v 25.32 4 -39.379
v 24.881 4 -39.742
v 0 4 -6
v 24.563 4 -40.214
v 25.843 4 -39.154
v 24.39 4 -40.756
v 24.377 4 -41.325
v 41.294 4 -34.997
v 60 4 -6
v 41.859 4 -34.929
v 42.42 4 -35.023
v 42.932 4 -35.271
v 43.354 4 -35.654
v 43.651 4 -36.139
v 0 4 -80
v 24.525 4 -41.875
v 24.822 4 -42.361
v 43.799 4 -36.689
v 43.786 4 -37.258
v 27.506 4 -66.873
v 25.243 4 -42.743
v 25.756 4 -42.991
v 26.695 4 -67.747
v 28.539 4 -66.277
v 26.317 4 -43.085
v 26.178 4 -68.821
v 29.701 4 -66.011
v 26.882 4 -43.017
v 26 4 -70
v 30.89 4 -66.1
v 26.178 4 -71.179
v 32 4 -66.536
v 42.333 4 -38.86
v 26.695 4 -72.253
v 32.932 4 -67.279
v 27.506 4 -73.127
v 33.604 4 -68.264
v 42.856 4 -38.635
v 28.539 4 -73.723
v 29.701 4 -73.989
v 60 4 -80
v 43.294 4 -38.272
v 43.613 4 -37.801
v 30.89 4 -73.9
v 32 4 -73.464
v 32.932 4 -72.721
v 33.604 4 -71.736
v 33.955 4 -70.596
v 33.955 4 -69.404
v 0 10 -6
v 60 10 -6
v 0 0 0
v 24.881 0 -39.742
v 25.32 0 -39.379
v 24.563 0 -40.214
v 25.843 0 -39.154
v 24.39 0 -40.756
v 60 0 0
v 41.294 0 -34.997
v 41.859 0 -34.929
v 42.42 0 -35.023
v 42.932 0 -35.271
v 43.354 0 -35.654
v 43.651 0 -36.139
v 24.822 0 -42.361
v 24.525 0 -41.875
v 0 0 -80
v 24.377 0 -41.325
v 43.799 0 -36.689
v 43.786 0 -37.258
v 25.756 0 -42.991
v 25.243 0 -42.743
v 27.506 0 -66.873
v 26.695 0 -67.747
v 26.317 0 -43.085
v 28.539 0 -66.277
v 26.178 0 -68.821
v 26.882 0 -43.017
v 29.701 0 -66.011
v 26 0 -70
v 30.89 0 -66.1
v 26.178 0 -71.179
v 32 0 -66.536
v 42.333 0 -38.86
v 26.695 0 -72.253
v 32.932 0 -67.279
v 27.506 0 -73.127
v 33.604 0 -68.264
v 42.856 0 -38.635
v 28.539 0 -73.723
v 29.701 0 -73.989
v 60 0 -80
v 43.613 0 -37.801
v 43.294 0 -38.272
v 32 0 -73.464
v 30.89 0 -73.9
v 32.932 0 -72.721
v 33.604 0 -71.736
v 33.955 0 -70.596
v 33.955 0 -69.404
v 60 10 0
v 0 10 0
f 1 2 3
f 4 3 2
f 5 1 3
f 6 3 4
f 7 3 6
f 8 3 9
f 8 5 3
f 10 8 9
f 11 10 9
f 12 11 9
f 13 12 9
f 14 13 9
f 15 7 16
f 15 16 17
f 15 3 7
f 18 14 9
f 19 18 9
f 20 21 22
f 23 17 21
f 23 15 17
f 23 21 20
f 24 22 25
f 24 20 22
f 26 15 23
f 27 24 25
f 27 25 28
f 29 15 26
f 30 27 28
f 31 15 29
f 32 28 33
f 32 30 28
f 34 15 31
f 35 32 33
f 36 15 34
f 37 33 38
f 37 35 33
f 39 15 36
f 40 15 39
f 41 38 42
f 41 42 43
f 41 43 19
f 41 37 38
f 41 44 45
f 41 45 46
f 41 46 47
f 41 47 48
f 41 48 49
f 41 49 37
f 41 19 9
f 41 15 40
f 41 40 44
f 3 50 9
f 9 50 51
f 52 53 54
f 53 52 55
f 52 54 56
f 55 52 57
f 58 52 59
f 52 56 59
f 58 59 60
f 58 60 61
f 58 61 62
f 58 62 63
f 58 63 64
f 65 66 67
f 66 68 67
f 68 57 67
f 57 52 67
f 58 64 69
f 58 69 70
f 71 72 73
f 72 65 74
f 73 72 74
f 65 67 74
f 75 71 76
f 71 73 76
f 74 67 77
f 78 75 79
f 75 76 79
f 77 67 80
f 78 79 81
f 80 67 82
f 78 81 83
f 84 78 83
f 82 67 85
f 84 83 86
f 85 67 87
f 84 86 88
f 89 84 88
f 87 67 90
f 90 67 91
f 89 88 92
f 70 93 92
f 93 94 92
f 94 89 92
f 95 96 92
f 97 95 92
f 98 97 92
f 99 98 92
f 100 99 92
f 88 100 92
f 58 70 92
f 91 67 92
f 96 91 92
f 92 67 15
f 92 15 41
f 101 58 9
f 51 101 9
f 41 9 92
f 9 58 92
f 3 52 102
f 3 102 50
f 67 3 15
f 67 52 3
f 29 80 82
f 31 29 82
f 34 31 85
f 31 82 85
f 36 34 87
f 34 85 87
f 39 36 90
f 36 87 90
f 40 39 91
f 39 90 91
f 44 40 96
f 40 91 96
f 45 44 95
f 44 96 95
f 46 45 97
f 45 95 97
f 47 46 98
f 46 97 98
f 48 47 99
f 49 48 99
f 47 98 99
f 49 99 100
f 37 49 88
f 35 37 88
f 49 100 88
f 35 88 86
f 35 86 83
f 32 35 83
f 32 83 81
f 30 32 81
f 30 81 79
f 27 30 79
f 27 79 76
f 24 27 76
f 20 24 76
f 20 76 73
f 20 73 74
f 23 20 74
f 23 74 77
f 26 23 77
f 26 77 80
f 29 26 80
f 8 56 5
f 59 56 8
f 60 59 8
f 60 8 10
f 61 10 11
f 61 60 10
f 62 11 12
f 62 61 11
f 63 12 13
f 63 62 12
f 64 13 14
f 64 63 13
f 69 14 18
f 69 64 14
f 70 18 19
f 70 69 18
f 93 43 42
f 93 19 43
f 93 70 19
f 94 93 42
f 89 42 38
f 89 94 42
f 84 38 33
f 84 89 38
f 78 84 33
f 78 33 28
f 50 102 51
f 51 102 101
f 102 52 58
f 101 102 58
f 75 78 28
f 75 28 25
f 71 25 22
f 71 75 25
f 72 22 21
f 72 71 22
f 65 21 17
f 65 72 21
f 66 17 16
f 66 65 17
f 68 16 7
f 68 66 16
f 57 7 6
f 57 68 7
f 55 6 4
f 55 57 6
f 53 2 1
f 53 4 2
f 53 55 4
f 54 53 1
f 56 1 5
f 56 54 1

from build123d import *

# Parameters (mm, degrees)
SKETCH1_W                 = 60
SKETCH1_H                 = 80
BOSS_EXTRUDE1_DEPTH       = 4
SKETCH2_W                 = 60
SKETCH2_H                 = 10
BOSS_EXTRUDE2_DEPTH       = 6
F_8_0MM_DOWEL_HOLE1_D     = 8
F_8_0MM_DOWEL_HOLE1_DEPTH = 6
CUT_EXTRUDE1_DEPTH        = 101.498756211


with BuildPart() as part:
    # Sketch1 → Boss-Extrude1 (new body)
    with BuildSketch(Plane(origin=(0, 0, 0), x_dir=(1, 0, 0), z_dir=(0, 1, 0))):
        with Locations((30, 40)):
            Rectangle(SKETCH1_W, SKETCH1_H)
    extrude(amount=BOSS_EXTRUDE1_DEPTH)

    # Sketch2 → Boss-Extrude2 (add)
    with BuildSketch(Plane.XY):
        with Locations((30, 5)):
            Rectangle(SKETCH2_W, SKETCH2_H)
    extrude(amount=-BOSS_EXTRUDE2_DEPTH)

    # Ø8.0mm Dowel Hole1
    with Locations(Plane(origin=(0, 4, 0), x_dir=(1, 0, 0), z_dir=(0, 1, 0))):
        with Locations((30, 70)):
            Hole(F_8_0MM_DOWEL_HOLE1_D / 2, depth=F_8_0MM_DOWEL_HOLE1_DEPTH)

    # Sketch6 → Cut-Extrude1 (cut, through all)
    with BuildSketch(Plane.XZ):
        with BuildLine():
            Line((25.84299387, -39.154412182), (41.293514764, -34.997321359))
            ThreePointArc((41.293514764, -34.997321359), (43.744466229, -36.409000118), (42.33278747, -38.859951582))
            Line((42.33278747, -38.859951582), (26.882266576, -43.017042406))
            ThreePointArc((26.882266576, -43.017042406), (24.431315112, -41.605363647), (25.84299387, -39.154412182))
        make_face()
    extrude(amount=-CUT_EXTRUDE1_DEPTH, mode=Mode.SUBTRACT)


solid = part.part
